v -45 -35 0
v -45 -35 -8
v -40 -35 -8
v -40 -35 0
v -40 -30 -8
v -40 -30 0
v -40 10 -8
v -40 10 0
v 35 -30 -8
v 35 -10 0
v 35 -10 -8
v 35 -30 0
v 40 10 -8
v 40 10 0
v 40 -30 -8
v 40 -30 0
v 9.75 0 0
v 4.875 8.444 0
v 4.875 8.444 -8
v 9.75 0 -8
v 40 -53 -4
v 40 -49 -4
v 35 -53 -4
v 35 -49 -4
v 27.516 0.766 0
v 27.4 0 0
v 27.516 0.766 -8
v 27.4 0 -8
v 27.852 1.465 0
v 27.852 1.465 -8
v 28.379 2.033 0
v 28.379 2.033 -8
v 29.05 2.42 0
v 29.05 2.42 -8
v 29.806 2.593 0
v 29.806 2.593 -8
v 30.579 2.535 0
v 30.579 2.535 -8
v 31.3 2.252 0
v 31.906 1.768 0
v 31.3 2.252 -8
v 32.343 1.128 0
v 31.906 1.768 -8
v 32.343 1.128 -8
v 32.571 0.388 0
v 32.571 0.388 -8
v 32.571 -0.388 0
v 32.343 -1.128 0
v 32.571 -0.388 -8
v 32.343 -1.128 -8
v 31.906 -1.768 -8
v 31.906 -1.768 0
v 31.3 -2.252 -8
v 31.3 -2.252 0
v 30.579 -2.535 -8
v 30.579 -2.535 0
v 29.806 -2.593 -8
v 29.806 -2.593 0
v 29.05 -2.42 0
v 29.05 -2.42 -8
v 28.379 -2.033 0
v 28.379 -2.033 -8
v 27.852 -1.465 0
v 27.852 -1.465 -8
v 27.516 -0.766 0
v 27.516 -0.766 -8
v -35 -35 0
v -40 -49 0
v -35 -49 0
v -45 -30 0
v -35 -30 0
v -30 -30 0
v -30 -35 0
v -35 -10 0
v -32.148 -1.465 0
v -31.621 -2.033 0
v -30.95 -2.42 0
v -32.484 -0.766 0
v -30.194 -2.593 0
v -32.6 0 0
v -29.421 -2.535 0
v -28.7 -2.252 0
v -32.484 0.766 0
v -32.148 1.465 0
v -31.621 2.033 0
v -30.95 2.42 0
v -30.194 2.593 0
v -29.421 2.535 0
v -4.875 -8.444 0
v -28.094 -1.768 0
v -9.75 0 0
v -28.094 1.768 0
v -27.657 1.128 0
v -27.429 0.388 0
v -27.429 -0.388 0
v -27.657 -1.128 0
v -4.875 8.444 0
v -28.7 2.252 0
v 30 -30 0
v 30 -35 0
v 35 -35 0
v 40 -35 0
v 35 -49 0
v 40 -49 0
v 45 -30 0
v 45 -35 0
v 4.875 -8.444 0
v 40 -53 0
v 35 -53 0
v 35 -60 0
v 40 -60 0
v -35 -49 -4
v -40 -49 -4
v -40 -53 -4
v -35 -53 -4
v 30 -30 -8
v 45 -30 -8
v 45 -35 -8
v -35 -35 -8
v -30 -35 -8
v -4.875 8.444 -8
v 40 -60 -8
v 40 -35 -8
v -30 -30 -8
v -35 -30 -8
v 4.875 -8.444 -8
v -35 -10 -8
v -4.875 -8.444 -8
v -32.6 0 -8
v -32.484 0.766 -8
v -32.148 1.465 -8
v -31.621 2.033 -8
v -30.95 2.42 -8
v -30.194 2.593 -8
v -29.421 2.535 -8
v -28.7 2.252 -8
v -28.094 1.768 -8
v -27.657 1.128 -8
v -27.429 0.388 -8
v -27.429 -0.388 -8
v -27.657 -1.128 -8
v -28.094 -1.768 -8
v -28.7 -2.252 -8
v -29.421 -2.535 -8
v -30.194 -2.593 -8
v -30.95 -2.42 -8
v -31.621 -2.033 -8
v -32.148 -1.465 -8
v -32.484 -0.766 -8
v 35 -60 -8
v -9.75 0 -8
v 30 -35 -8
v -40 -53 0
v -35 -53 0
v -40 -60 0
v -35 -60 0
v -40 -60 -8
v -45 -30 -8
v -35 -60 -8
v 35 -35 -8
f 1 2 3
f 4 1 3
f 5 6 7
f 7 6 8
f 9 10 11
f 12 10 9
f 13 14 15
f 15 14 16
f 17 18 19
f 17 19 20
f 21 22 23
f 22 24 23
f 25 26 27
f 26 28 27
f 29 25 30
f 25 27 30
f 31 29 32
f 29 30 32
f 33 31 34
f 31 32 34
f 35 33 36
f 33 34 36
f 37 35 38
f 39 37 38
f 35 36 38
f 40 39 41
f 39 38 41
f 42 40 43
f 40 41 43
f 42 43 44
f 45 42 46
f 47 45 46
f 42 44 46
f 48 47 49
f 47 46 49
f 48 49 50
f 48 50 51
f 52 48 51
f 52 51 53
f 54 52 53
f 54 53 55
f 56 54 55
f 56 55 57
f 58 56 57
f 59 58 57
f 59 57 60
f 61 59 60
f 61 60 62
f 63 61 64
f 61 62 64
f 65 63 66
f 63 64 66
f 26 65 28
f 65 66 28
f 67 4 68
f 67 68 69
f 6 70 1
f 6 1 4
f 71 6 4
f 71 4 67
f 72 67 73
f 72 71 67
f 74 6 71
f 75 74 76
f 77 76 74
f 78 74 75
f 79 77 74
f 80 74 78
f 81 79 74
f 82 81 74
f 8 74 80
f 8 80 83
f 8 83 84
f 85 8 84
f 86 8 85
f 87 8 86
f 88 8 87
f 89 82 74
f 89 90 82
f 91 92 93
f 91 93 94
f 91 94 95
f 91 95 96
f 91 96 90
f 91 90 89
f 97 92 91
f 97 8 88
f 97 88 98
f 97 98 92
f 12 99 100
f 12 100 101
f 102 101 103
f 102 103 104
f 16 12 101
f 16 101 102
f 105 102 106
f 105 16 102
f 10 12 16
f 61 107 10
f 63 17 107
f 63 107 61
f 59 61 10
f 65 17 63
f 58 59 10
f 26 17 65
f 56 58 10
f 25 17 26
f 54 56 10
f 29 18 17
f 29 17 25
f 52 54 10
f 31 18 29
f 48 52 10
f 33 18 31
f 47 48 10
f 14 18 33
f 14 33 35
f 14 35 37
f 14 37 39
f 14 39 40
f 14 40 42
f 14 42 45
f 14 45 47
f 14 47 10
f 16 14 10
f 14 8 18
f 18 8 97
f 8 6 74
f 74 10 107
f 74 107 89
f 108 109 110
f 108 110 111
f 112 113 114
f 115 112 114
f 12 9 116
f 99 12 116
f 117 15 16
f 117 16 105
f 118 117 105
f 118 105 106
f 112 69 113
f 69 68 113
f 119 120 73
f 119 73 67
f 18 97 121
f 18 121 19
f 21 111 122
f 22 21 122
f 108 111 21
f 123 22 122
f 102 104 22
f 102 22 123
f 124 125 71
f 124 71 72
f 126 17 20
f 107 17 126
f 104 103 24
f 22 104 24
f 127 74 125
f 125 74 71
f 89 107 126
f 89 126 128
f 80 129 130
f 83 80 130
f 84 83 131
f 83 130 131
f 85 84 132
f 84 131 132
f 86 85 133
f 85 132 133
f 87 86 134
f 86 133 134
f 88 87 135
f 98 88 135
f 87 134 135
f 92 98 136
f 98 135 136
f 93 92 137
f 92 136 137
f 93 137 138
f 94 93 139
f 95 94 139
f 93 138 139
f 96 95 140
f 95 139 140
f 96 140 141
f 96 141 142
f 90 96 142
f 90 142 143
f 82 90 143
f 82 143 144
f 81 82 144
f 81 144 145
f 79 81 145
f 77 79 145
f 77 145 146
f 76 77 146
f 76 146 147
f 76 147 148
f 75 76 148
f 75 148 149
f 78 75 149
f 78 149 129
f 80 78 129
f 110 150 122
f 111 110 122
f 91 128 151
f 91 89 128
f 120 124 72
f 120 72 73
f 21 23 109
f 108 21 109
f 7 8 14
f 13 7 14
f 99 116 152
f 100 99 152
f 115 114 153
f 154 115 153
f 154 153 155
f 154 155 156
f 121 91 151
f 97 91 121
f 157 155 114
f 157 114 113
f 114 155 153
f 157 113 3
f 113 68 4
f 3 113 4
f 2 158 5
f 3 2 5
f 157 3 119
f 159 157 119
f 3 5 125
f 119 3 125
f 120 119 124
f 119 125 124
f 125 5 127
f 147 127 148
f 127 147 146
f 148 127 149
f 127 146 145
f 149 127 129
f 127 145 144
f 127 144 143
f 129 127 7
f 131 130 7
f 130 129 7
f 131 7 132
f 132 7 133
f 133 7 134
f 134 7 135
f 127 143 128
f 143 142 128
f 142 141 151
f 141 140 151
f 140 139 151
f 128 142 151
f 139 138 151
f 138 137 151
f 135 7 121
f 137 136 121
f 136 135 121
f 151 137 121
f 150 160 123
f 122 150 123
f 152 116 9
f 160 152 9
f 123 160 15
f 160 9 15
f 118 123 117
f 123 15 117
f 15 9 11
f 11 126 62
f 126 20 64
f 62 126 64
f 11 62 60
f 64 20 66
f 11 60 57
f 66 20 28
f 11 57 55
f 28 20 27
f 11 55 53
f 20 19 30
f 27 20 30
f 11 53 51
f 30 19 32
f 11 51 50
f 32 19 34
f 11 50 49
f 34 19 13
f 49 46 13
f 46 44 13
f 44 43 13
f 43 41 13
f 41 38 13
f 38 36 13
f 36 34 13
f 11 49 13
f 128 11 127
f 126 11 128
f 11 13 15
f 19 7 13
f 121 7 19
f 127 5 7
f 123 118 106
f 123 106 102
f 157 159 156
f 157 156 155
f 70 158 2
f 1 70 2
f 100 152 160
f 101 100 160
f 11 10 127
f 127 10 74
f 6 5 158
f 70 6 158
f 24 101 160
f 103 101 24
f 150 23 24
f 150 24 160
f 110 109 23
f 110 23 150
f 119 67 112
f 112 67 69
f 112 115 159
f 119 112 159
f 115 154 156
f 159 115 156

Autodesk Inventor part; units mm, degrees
ref_plane "YZ Plane" through (0, 0, 0) normal (1, 0, 0) x (0, 1, 0)
ref_plane "XZ Plane" through (0, 0, 0) normal (0, 1, 0) x (-1, 0, 0)
ref_plane "XY Plane" through (0, 0, 0) normal (0, 0, 1) x (1, 0, 0)
sketch "Sketch1" plane through (0, 0, 0) normal (0, 0, 1) x (1, 0, 0)
  line L0 (40, -10) -> (-40, -10)
  line L1 (-40, -10) -> (-40, 10)
  line L2 (-40, 10) -> (40, 10)
  line L3 (40, 10) -> (40, -10)
  line L4 (0, -14) -> (0, 14) projected
  line L5 (40, -10) -> (30, -10)
  line L6 (-56, 0) -> (56, 0) projected
  circle A0 centre (-0.5449, 0.9437) radius 3.3235 projected
  line L7 (-4.875, -6.5563) -> (-9.2051, 0.9437) projected
  line L8 (-9.2051, 0.9437) -> (-4.875, 8.4437) projected
  line L9 (-4.875, 8.4437) -> (3.7853, 8.4437) projected
  line L10 (3.7853, 8.4437) -> (8.1154, 0.9437) projected
  line L11 (8.1154, 0.9437) -> (3.7853, -6.5563) projected
  line L12 (3.7853, -6.5563) -> (-4.875, -6.5563) projected
  circle A1 centre (-0.5449, 0.9437) radius 3.3235 projected
  line L13 (-4.875, -6.5563) -> (-9.2051, 0.9437) projected
  line L14 (-9.2051, 0.9437) -> (-4.875, 8.4437) projected
  line L15 (-4.875, 8.4437) -> (3.7853, 8.4437) projected
  line L16 (3.7853, 8.4437) -> (8.1154, 0.9437) projected
  line L17 (8.1154, 0.9437) -> (3.7853, -6.5563) projected
  line L18 (3.7853, -6.5563) -> (-4.875, -6.5563) projected
  point P0 (0, 0)
  dimension "d0" = 80
  dimension "d1" = 20
  dimension "d70" = 40
  dimension "d73" = 10
extrude "Extrusion1" add sketch "Sketch1" against normal blind 8
sketch "Sketch3" plane through (0, 0, 0) normal (0, 0, 1) x (1, 0, 0)
  line L0 (0, -14) -> (0, 14) projected
  line L1 (-56, 0) -> (56, 0) projected
  line L2 (-4.875, 8.4437) -> (4.875, 8.4437)
  line L3 (4.875, 8.4437) -> (9.75, 0)
  line L4 (9.75, 0) -> (4.875, -8.4437)
  line L5 (4.875, -8.4437) -> (-4.875, -8.4437)
  line L6 (-4.875, -8.4437) -> (-9.75, 0)
  line L7 (-9.75, 0) -> (-4.875, 8.4437)
  point P0 (0, 0)
  point P1 (0, 0)
  dimension "d65" = 19.5
extrude "Extrusion2" cut sketch "Sketch3" against normal blind 10
sketch "Sketch9" plane through (0, 0, -8) normal (0, 0, -1) x (-1, 0, 0)
  circle A0 centre (-30, 0) radius 2.6
  line L0 (0, -14) -> (0, 14) projected
  line L1 (56, 0) -> (-56, 0) projected
  circle A1 centre (30, 0) radius 2.6
  dimension "d40" = 5.2
  dimension "d41" = 60
extrude "Extrusion3" cut sketch "Sketch9" against normal through all
sketch "Sketch14" plane through (0, 0, 0) normal (0, 0, 1) x (1, 0, 0)
  circle A0 centre (30, 0) radius 2.6 projected
  circle A1 centre (-30, 0) radius 2.6 projected
  line L0 (-9.75, 0) -> (-4.875, 8.4437) projected
  line L1 (-4.875, 8.4437) -> (4.875, 8.4437) projected
  line L2 (4.875, 8.4437) -> (9.75, 0) projected
  line L3 (9.75, 0) -> (4.875, -8.4437) projected
  line L4 (4.875, -8.4437) -> (-4.875, -8.4437) projected
  line L5 (-4.875, -8.4437) -> (-9.75, 0) projected
  line L6 (40, -10) -> (-40, -10) projected
  line L7 (40, 10) -> (40, -10) projected
  line L8 (-40, 10) -> (40, 10) projected
  line L9 (-40, -10) -> (-40, 10) projected
  line L10 (-40, -10) -> (-35, -10)
  line L11 (-35, -10) -> (-35, -60)
  line L12 (-35, -60) -> (-40, -60)
  line L13 (-40, -60) -> (-40, -10)
  line L14 (-56, 0) -> (56, 0) projected
  line L15 (0, -33.313) -> (0, 17.2188) projected
  line L16 (40, -10) -> (35, -10)
  line L17 (35, -10) -> (35, -60)
  line L18 (35, -60) -> (40, -60)
  line L19 (40, -60) -> (40, -10)
  line L20 (-40, -30) -> (-45, -30)
  line L21 (-45, -30) -> (-45, -35)
  line L22 (-45, -35) -> (-40, -35)
  line L23 (-40, -35) -> (-40, -30)
  line L24 (-35, -30) -> (-30, -30)
  line L25 (-30, -30) -> (-30, -35)
  line L26 (-30, -35) -> (-35, -35)
  line L27 (-35, -35) -> (-35, -30)
  line L28 (40, -30) -> (45, -30)
  line L29 (45, -30) -> (45, -35)
  line L30 (45, -35) -> (40, -35)
  line L31 (40, -35) -> (40, -30)
  line L32 (35, -30) -> (30, -30)
  line L33 (30, -30) -> (30, -35)
  line L34 (30, -35) -> (35, -35)
  line L35 (35, -35) -> (35, -30)
  point P0 (0, 0)
  dimension "d74" = 5
  dimension "d75" = 50
  dimension "d78" = 5
  dimension "d79" = 5
  dimension "d80" = 5
  dimension "d81" = 20
extrude "Extrusion8" add sketch "Sketch14" against normal blind 8 contours L19 L18 L17 L6 | L28 L29 L30 L19 | L17 L34 L33 L32 | L11 L12 L13 L6 | L24 L25 L26 L11 | L13 L22 L21 L20
sketch "Sketch15" plane through (-40, -60, 0) normal (-1, 0, 0) x (0, 0, 1)
  line L0 (0, 25) -> (-8, 25) projected
  line L1 (-8, 0) -> (-8, 25) projected
  line L2 (0, 0) -> (-8, 0) projected
  line L3 (0, 25) -> (0, 0) projected
  line L4 (0, 70) -> (0, 30) projected
  line L5 (0, 70) -> (-8, 70) projected
  line L6 (-8, 30) -> (-8, 70) projected
  line L7 (0, 30) -> (-8, 30) projected
  line L8 (0, 25) -> (-8, 25) projected
  line L9 (0, 30) -> (0, 25) projected
  line L10 (0, 30) -> (-8, 30) projected
  line L11 (-8, 25) -> (-8, 30) projected
  line L12 (0, 25) -> (-8, 25) projected
  line L13 (0, 11) -> (-4, 11)
  line L14 (-4, 11) -> (-4, 7)
  line L15 (-4, 7) -> (0, 7)
  line L16 (0, 7) -> (0, 11)
  point P0 (0, 60)
  dimension "d84" = 4
  dimension "d85" = 4
  dimension "d89" = 14
extrude "Extrusion9" cut sketch "Sketch15" against normal through all contours L3 L15 L14 L13
properties part number "drieparts_assembly2" material "ABS Plastic"
